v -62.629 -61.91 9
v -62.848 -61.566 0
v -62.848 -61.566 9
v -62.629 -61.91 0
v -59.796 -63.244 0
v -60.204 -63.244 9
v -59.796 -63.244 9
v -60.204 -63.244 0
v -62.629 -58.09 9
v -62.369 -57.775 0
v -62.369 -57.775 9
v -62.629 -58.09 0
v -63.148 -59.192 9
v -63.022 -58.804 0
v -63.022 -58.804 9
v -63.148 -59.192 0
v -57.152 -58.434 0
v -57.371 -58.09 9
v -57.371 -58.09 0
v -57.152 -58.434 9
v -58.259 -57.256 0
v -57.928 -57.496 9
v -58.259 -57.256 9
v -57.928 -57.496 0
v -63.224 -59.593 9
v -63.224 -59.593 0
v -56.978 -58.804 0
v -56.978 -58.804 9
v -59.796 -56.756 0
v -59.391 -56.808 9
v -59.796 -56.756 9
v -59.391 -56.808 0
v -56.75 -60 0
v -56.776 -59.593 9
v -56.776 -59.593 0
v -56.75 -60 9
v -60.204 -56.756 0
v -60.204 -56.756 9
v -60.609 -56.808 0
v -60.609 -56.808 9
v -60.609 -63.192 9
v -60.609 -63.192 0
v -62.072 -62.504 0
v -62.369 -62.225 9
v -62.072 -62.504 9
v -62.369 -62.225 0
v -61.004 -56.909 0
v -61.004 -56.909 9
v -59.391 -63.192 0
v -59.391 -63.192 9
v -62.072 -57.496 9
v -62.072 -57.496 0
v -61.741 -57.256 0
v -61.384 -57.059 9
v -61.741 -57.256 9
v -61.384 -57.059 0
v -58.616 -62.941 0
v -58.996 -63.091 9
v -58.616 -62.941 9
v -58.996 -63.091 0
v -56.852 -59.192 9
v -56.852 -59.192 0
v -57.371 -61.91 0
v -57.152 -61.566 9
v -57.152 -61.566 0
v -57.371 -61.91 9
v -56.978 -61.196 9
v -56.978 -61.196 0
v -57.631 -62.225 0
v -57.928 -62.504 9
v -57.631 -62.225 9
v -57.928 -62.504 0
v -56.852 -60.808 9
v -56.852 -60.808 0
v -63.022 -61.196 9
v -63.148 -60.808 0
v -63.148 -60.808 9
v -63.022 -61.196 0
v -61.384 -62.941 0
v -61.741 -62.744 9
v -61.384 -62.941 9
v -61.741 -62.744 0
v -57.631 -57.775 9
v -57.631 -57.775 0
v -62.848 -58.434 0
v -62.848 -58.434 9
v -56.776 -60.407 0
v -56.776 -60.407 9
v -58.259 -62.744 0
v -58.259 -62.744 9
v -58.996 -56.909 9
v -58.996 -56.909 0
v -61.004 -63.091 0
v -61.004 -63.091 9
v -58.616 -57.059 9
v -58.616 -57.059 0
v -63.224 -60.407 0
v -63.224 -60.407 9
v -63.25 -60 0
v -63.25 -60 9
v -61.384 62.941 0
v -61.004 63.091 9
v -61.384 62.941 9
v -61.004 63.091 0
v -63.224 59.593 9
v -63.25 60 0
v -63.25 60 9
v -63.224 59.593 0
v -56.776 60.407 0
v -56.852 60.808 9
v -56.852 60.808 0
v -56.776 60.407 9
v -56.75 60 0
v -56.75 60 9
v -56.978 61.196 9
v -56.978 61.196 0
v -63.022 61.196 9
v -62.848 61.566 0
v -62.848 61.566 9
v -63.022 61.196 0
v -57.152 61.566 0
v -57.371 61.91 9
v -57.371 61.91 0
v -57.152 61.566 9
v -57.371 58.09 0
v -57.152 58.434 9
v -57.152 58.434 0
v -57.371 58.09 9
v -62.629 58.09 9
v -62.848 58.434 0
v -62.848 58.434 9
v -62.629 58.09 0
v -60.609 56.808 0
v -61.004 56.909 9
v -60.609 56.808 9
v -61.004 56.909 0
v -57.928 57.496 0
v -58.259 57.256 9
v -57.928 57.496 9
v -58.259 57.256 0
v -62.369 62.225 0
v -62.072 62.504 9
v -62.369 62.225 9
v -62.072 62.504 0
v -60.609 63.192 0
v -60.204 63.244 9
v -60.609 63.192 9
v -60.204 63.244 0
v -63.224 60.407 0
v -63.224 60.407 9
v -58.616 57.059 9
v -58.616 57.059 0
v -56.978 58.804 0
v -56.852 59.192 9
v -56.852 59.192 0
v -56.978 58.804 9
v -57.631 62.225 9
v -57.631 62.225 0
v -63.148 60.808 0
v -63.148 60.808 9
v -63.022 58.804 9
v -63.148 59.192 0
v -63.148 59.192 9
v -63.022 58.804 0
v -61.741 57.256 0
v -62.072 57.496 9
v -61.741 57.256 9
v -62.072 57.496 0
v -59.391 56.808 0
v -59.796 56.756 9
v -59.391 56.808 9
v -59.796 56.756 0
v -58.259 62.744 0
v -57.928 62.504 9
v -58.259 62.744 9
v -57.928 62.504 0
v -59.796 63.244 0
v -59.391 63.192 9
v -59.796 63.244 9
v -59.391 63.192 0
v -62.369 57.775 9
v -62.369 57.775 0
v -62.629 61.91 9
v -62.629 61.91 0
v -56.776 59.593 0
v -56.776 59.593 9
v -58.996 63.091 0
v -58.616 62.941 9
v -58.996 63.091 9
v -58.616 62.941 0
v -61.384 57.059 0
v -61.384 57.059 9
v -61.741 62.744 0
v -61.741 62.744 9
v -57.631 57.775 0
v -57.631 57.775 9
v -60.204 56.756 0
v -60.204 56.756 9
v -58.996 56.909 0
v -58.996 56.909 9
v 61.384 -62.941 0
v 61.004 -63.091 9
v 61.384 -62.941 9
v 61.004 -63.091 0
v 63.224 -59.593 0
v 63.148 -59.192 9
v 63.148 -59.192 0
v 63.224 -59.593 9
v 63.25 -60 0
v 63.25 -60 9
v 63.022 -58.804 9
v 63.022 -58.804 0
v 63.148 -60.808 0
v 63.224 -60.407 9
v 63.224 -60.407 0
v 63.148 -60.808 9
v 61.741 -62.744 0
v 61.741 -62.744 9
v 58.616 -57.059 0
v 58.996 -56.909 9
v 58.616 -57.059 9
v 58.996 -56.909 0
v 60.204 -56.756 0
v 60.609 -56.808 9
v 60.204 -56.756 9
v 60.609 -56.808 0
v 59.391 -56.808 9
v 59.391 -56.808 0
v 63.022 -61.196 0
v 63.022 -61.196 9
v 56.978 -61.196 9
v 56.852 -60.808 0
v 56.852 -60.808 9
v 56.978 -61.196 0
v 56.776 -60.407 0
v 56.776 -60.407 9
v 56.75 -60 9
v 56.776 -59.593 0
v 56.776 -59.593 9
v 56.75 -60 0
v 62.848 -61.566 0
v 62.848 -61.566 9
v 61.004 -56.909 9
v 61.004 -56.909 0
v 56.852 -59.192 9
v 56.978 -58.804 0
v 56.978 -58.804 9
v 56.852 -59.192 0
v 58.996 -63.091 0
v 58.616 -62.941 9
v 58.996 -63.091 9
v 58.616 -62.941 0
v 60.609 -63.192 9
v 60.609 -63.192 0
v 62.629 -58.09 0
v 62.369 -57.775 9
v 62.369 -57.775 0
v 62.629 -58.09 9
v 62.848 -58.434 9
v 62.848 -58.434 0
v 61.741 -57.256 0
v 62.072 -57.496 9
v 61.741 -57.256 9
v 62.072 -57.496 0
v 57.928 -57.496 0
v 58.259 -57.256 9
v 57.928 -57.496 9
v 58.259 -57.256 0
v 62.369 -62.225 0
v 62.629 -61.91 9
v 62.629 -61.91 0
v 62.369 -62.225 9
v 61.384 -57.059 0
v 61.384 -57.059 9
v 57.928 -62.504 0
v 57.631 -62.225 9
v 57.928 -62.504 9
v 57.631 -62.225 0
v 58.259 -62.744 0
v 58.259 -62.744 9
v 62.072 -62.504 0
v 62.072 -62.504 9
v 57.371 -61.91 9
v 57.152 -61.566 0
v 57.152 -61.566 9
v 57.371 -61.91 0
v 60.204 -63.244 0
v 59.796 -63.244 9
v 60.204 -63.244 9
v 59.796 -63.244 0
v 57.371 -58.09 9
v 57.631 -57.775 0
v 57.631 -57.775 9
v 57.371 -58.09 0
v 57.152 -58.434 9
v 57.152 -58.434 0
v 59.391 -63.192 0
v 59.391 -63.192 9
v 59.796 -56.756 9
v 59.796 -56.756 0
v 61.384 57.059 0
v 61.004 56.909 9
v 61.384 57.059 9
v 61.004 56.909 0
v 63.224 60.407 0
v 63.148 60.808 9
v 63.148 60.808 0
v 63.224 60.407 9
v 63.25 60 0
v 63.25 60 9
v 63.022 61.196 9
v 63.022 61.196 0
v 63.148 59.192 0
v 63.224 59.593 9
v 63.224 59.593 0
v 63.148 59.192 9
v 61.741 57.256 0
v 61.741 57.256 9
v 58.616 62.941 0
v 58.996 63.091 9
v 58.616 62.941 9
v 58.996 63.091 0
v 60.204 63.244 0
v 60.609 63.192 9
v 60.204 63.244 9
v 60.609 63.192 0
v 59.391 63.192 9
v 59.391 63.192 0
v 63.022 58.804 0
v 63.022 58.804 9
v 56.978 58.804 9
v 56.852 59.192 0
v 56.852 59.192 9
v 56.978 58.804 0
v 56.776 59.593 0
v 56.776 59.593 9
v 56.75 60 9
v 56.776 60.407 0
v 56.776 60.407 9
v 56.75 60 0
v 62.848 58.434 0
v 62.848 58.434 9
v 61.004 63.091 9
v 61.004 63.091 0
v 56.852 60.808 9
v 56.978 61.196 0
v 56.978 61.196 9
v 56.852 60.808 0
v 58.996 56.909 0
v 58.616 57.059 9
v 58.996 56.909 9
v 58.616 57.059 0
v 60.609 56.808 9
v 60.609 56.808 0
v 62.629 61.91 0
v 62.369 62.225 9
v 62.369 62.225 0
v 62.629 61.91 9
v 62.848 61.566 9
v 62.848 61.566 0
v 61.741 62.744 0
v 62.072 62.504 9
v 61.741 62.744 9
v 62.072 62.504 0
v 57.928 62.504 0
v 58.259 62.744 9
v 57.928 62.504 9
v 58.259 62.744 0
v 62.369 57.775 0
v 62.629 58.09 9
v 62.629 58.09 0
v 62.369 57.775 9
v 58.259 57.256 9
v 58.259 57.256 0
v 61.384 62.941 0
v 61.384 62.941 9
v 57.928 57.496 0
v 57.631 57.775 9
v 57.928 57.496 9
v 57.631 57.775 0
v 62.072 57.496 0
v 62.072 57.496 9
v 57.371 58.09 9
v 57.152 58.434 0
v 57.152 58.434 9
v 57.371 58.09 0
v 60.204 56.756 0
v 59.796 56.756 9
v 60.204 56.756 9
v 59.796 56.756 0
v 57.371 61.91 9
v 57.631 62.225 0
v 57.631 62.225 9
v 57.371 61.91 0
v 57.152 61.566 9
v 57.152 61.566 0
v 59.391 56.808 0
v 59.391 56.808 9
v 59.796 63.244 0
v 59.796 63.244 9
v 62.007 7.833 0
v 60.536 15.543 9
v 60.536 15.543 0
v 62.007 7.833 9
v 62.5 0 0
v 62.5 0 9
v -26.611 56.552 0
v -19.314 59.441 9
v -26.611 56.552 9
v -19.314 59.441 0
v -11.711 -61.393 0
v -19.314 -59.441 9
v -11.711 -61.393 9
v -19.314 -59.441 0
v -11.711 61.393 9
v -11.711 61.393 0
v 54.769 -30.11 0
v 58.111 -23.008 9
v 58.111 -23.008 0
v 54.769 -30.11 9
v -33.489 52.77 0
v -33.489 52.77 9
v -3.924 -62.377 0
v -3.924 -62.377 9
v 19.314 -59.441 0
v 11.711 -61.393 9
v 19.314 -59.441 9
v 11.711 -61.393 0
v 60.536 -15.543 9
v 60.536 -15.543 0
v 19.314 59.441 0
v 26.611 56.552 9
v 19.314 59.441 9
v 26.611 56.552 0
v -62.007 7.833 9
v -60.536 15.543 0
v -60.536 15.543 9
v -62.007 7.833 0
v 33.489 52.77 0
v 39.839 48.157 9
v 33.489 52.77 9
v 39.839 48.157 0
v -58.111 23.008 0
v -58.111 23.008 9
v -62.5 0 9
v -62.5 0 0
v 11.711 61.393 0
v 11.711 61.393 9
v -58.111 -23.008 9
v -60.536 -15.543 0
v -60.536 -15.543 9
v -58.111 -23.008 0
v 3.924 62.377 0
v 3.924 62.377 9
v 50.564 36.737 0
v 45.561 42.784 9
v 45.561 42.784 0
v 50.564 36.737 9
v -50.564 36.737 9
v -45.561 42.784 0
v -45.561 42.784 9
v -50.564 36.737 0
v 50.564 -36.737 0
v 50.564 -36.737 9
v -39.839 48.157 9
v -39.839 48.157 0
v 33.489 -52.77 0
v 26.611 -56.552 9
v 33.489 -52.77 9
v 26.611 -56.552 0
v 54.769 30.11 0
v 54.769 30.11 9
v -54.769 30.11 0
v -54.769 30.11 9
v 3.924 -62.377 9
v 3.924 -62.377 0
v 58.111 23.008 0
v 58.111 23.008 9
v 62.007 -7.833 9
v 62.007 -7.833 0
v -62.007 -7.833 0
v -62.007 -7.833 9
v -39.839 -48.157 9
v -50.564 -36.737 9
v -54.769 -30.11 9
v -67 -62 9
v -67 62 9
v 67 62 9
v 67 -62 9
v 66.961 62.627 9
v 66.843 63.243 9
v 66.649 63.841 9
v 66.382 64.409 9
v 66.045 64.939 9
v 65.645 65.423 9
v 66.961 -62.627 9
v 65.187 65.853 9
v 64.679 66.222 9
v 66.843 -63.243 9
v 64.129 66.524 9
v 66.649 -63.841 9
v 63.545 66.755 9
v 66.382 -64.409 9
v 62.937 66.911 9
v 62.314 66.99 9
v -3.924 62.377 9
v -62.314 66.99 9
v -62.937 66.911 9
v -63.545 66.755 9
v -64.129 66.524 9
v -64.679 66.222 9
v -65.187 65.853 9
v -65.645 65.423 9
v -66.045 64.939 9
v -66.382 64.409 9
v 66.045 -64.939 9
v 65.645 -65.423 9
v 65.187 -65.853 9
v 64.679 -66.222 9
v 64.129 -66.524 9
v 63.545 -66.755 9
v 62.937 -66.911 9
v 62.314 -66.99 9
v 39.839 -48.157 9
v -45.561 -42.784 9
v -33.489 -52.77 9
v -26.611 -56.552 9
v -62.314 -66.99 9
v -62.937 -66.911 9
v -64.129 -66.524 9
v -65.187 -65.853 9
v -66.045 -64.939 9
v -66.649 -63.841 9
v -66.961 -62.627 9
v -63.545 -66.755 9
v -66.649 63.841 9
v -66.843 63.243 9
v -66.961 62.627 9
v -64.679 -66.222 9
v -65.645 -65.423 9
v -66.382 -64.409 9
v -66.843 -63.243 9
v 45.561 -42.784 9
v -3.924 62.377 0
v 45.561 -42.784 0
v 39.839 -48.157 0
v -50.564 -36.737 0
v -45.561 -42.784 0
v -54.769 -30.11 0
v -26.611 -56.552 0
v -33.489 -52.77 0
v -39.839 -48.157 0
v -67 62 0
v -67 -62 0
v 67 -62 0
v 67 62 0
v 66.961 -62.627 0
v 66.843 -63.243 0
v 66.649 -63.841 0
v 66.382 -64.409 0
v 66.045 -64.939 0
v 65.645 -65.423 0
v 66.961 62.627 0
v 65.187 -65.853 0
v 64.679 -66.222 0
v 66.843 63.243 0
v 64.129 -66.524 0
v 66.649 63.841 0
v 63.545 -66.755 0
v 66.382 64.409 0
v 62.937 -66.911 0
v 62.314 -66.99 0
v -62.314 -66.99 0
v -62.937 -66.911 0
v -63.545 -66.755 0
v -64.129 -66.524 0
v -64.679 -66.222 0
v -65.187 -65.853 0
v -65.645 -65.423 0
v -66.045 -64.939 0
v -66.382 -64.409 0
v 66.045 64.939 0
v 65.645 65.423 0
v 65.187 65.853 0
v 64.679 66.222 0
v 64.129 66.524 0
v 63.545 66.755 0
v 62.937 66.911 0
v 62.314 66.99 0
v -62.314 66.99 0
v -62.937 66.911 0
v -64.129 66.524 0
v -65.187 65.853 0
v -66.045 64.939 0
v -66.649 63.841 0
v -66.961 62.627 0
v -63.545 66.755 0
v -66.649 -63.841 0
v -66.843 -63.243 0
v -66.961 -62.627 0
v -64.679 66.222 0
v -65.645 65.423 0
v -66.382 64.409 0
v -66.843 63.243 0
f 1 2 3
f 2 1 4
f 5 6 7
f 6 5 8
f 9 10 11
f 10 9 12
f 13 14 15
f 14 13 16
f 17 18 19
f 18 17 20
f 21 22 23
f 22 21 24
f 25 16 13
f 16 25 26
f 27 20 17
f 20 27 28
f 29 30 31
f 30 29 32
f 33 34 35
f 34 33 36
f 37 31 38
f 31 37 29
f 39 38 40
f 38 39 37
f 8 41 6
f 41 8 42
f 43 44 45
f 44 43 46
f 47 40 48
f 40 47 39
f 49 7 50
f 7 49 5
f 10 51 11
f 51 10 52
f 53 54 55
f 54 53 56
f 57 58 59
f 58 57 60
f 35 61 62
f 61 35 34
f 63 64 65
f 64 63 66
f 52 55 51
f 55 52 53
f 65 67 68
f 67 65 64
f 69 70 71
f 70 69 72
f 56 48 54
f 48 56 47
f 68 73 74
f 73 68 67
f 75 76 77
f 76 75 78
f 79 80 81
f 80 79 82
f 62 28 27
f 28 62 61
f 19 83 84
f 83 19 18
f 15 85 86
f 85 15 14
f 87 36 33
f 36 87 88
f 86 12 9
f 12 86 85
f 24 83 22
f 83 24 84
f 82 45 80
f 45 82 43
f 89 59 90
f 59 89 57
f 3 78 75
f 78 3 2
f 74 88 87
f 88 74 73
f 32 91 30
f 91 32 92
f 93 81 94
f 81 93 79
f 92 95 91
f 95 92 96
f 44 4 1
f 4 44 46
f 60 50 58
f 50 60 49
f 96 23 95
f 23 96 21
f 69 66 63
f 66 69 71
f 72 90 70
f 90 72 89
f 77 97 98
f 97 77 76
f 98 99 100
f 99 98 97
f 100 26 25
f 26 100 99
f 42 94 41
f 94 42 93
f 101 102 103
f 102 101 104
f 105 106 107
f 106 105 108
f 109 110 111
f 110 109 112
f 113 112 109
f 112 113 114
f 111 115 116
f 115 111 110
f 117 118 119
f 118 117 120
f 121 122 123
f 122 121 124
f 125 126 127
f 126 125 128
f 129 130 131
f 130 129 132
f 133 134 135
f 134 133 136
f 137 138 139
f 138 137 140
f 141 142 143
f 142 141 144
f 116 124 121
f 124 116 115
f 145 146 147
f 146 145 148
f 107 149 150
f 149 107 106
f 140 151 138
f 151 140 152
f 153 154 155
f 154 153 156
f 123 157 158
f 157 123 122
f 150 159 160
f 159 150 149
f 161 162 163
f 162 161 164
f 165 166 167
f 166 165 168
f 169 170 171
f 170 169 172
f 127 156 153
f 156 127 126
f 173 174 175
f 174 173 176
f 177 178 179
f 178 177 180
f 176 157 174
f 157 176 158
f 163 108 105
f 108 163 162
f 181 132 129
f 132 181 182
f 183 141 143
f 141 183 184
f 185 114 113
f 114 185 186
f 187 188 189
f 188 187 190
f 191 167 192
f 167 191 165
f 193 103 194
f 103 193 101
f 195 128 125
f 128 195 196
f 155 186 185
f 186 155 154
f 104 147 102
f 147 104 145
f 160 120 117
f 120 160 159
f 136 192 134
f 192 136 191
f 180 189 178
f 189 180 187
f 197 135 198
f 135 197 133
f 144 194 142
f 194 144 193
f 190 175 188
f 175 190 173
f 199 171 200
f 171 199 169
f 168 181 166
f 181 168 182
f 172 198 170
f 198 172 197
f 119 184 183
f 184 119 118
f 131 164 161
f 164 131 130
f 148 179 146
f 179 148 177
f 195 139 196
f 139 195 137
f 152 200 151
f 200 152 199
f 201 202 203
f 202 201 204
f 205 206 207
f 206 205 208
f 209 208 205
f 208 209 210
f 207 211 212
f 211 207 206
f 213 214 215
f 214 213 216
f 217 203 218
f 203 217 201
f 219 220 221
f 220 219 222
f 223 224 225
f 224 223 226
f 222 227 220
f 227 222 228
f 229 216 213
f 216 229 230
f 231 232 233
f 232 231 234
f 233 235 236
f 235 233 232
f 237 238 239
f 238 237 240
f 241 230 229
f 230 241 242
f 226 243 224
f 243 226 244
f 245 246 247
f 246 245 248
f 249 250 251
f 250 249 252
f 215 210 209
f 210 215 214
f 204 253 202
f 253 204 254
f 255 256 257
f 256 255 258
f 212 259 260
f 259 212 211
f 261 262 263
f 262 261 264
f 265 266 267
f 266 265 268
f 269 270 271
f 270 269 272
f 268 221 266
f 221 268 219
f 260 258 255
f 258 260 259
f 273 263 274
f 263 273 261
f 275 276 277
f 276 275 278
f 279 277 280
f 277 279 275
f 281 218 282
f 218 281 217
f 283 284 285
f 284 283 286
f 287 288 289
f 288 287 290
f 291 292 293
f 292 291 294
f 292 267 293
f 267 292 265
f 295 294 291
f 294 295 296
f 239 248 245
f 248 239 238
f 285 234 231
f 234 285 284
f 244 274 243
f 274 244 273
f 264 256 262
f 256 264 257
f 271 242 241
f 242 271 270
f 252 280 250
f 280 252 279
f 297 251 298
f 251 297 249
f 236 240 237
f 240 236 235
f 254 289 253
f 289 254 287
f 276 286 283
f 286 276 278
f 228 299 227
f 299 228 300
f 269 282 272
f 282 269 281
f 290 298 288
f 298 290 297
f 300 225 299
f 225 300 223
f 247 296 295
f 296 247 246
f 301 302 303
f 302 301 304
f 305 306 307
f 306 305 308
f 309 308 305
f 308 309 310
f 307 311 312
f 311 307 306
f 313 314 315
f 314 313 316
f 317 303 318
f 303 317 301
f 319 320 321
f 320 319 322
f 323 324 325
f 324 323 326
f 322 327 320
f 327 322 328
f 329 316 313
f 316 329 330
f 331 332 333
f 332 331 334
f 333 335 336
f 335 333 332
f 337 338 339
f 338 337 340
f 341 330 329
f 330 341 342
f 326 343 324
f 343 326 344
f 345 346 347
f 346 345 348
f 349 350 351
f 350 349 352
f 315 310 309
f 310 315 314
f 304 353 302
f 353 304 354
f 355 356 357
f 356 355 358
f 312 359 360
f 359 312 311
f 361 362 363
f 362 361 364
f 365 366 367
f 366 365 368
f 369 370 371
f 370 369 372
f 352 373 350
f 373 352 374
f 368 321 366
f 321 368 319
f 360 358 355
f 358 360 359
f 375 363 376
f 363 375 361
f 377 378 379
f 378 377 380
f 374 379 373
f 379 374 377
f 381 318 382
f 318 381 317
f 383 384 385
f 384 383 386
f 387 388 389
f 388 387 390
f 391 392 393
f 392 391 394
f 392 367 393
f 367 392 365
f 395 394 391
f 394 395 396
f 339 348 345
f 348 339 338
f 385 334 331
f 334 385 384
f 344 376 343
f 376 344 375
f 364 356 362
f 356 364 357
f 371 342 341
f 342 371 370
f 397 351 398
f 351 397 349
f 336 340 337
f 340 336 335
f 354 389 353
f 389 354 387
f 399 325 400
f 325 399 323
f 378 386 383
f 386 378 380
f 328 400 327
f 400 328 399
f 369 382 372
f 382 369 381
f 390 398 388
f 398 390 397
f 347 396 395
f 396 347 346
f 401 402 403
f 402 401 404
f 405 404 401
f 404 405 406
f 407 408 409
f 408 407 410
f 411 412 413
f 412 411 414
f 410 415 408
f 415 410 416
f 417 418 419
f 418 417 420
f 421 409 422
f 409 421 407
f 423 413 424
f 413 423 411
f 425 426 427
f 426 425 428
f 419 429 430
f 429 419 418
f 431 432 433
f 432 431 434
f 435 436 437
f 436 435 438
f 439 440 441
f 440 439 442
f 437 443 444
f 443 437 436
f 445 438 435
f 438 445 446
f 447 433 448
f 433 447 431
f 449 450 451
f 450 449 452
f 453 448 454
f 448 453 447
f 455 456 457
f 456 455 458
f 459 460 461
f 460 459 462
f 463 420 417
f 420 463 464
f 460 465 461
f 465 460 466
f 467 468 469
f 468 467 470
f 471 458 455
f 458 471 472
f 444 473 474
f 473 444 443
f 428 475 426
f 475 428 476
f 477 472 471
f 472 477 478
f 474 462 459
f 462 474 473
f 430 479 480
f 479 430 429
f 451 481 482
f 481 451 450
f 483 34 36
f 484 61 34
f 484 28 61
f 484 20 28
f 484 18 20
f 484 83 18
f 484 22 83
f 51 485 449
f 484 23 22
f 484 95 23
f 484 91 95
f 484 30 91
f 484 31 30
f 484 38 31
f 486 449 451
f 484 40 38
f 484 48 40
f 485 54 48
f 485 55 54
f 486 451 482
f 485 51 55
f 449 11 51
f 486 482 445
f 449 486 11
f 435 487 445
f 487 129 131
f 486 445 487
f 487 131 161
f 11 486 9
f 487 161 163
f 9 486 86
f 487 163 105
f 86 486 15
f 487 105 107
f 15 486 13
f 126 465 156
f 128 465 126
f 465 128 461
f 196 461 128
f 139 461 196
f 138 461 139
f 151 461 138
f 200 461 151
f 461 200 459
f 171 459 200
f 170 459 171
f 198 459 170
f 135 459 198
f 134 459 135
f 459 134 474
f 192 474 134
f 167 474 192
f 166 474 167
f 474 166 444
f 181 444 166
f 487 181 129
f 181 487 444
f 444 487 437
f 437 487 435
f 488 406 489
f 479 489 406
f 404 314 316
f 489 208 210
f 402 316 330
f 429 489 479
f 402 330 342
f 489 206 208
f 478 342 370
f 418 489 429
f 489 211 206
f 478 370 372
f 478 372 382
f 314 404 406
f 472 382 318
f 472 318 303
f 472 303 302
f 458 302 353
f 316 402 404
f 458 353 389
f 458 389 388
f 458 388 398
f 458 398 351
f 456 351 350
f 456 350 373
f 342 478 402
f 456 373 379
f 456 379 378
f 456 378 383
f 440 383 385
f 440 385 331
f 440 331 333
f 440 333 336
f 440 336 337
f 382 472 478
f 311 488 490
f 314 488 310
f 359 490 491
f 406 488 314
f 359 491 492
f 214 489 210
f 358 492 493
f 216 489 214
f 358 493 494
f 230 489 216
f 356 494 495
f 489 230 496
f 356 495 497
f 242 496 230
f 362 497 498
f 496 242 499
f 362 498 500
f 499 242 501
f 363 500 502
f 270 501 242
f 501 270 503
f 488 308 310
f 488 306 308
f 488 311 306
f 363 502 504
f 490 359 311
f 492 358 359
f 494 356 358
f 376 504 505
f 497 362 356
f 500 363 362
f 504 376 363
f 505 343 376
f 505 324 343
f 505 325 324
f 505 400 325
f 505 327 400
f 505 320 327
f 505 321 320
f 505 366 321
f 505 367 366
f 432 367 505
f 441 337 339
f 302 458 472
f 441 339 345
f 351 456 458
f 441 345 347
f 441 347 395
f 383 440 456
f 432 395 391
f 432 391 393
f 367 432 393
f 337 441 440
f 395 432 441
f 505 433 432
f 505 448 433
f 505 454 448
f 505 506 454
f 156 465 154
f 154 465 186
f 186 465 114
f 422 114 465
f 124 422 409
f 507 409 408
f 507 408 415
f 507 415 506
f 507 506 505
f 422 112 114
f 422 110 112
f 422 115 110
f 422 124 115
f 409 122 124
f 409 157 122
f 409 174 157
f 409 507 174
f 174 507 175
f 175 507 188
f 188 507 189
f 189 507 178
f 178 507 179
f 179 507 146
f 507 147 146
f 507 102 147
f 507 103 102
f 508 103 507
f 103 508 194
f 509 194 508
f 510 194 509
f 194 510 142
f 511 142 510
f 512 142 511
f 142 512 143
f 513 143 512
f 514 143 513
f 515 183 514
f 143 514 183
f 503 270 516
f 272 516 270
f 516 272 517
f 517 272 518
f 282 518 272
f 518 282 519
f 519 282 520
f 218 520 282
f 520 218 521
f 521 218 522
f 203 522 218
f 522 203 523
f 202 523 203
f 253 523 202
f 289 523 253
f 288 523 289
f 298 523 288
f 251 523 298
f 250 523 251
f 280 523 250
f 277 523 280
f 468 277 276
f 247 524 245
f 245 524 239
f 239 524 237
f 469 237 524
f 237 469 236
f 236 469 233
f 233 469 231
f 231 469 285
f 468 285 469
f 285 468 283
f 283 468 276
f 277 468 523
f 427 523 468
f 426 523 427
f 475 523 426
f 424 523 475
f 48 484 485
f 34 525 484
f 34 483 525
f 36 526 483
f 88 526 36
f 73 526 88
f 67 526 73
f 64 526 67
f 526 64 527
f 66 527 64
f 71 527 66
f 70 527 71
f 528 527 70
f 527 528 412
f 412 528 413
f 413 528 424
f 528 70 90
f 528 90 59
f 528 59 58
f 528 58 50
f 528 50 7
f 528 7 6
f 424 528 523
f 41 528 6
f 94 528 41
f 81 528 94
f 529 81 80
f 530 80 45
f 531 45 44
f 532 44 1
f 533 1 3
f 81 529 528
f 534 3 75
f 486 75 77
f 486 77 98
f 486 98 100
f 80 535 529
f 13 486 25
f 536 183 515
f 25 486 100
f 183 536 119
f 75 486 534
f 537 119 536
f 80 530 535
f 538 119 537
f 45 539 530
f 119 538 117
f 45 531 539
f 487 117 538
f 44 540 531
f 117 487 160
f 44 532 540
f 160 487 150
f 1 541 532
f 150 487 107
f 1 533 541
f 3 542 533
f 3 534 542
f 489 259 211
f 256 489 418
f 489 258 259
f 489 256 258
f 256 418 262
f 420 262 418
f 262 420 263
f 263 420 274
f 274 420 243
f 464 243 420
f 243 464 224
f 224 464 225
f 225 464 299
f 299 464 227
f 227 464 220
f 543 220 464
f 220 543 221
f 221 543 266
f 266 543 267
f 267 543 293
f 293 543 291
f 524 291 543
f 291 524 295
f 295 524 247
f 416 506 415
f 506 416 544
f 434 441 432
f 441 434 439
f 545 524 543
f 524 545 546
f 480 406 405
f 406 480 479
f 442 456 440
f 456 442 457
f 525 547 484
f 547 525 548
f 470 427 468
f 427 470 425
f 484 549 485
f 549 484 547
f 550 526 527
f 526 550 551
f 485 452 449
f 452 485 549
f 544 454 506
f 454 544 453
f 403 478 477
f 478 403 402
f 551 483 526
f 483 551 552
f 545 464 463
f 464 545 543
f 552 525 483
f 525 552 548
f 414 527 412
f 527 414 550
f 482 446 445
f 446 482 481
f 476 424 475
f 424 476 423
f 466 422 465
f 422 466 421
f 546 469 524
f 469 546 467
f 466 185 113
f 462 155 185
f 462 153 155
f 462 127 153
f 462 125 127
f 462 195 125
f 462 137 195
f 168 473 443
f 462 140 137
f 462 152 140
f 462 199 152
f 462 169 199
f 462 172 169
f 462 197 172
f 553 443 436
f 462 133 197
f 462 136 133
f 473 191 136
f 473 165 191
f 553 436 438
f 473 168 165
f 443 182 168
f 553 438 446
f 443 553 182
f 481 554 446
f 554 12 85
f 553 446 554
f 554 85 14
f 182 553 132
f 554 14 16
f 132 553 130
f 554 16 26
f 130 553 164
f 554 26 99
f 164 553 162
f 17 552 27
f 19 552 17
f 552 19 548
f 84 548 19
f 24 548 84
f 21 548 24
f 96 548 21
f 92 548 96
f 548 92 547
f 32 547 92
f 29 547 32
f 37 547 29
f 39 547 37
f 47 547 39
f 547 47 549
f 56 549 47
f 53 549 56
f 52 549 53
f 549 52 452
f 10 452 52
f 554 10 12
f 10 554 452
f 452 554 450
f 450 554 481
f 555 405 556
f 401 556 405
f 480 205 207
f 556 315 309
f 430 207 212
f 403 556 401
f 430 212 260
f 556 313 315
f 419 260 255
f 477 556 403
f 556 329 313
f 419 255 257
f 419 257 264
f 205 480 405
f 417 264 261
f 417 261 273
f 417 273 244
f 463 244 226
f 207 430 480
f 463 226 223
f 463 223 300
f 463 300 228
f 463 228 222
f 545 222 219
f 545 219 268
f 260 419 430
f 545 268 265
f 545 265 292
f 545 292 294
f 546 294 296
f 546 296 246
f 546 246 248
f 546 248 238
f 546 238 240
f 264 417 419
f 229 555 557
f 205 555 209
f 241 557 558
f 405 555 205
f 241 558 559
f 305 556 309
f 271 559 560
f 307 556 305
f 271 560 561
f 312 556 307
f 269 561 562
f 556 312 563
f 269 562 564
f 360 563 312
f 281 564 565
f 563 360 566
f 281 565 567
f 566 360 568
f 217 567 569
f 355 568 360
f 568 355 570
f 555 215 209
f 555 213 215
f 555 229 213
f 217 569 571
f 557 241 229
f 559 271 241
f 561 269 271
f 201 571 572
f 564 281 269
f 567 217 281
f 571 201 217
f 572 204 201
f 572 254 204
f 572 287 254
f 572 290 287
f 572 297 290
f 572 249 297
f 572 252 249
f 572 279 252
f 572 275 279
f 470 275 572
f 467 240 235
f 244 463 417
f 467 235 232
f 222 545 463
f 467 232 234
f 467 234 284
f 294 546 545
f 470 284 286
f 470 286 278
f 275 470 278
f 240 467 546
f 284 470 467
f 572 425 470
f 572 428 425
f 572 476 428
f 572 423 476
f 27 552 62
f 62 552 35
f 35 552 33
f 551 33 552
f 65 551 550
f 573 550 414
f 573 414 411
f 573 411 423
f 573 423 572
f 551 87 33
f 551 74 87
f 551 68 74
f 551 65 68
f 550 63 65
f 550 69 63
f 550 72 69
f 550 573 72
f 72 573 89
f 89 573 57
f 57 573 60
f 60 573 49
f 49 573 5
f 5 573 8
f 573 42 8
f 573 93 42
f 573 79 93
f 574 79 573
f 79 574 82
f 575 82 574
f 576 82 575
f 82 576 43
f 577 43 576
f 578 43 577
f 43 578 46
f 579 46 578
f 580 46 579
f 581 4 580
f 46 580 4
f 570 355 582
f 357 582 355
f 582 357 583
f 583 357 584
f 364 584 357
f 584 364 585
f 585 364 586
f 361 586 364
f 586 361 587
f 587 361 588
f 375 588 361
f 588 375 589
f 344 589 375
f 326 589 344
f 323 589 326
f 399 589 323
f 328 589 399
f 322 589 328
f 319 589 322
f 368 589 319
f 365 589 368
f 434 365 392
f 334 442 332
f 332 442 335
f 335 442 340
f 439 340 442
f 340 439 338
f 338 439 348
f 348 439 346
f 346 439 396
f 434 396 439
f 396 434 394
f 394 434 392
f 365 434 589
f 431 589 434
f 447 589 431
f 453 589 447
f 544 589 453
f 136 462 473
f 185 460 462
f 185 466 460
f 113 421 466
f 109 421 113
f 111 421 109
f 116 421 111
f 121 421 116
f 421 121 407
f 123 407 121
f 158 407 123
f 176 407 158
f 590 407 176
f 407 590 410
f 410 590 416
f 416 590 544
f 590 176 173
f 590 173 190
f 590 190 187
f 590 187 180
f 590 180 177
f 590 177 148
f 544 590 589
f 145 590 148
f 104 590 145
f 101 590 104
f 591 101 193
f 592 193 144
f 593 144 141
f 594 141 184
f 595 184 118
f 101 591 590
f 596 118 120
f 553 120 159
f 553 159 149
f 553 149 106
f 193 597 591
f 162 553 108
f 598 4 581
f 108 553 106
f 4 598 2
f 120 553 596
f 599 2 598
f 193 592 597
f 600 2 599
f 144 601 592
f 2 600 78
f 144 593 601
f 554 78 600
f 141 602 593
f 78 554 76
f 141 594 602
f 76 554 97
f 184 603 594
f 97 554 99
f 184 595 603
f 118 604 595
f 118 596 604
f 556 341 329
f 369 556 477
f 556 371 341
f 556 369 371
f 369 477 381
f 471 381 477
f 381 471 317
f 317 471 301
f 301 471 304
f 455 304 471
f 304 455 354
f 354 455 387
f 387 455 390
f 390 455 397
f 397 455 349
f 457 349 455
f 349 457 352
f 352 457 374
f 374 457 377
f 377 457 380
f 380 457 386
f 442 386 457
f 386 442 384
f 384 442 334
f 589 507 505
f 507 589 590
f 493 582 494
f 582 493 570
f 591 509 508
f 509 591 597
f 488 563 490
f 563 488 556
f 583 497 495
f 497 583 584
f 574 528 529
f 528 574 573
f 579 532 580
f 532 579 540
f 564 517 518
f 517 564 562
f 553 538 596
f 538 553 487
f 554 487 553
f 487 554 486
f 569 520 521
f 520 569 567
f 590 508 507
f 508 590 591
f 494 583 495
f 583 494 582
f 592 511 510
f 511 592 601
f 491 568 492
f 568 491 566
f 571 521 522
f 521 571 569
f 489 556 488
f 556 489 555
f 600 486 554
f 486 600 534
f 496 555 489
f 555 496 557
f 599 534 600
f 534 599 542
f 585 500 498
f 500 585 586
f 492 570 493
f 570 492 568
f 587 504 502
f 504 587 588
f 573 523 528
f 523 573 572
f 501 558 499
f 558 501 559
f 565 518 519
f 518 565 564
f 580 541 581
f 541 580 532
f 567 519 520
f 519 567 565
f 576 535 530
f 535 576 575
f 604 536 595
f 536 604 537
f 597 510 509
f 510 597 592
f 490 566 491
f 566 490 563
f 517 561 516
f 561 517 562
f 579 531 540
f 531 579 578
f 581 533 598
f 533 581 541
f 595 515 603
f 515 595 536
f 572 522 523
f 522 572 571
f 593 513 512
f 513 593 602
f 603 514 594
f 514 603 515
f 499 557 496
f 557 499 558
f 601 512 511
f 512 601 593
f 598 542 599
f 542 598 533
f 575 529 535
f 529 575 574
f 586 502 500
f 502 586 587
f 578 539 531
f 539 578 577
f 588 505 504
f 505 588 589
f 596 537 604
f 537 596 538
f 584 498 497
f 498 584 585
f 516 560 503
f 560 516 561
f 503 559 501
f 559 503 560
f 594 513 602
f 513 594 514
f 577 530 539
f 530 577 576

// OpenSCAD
$fn = 50;


difference() {
	union() {
		hull() {
			translate(v = [-62.0000000000, 62.0000000000, 0]) {
				cylinder(h = 9, r = 5);
			}
			translate(v = [62.0000000000, 62.0000000000, 0]) {
				cylinder(h = 9, r = 5);
			}
			translate(v = [-62.0000000000, -62.0000000000, 0]) {
				cylinder(h = 9, r = 5);
			}
			translate(v = [62.0000000000, -62.0000000000, 0]) {
				cylinder(h = 9, r = 5);
			}
		}
	}
	union() {
		#translate(v = [-60.0000000000, -60.0000000000, -100.0000000000]) {
			cylinder(h = 200, r = 3.2500000000);
		}
		#translate(v = [-60.0000000000, 60.0000000000, -100.0000000000]) {
			cylinder(h = 200, r = 3.2500000000);
		}
		#translate(v = [60.0000000000, -60.0000000000, -100.0000000000]) {
			cylinder(h = 200, r = 3.2500000000);
		}
		#translate(v = [60.0000000000, 60.0000000000, -100.0000000000]) {
			cylinder(h = 200, r = 3.2500000000);
		}
		#cylinder(h = 9, r = 62.5000000000);
	}
}
